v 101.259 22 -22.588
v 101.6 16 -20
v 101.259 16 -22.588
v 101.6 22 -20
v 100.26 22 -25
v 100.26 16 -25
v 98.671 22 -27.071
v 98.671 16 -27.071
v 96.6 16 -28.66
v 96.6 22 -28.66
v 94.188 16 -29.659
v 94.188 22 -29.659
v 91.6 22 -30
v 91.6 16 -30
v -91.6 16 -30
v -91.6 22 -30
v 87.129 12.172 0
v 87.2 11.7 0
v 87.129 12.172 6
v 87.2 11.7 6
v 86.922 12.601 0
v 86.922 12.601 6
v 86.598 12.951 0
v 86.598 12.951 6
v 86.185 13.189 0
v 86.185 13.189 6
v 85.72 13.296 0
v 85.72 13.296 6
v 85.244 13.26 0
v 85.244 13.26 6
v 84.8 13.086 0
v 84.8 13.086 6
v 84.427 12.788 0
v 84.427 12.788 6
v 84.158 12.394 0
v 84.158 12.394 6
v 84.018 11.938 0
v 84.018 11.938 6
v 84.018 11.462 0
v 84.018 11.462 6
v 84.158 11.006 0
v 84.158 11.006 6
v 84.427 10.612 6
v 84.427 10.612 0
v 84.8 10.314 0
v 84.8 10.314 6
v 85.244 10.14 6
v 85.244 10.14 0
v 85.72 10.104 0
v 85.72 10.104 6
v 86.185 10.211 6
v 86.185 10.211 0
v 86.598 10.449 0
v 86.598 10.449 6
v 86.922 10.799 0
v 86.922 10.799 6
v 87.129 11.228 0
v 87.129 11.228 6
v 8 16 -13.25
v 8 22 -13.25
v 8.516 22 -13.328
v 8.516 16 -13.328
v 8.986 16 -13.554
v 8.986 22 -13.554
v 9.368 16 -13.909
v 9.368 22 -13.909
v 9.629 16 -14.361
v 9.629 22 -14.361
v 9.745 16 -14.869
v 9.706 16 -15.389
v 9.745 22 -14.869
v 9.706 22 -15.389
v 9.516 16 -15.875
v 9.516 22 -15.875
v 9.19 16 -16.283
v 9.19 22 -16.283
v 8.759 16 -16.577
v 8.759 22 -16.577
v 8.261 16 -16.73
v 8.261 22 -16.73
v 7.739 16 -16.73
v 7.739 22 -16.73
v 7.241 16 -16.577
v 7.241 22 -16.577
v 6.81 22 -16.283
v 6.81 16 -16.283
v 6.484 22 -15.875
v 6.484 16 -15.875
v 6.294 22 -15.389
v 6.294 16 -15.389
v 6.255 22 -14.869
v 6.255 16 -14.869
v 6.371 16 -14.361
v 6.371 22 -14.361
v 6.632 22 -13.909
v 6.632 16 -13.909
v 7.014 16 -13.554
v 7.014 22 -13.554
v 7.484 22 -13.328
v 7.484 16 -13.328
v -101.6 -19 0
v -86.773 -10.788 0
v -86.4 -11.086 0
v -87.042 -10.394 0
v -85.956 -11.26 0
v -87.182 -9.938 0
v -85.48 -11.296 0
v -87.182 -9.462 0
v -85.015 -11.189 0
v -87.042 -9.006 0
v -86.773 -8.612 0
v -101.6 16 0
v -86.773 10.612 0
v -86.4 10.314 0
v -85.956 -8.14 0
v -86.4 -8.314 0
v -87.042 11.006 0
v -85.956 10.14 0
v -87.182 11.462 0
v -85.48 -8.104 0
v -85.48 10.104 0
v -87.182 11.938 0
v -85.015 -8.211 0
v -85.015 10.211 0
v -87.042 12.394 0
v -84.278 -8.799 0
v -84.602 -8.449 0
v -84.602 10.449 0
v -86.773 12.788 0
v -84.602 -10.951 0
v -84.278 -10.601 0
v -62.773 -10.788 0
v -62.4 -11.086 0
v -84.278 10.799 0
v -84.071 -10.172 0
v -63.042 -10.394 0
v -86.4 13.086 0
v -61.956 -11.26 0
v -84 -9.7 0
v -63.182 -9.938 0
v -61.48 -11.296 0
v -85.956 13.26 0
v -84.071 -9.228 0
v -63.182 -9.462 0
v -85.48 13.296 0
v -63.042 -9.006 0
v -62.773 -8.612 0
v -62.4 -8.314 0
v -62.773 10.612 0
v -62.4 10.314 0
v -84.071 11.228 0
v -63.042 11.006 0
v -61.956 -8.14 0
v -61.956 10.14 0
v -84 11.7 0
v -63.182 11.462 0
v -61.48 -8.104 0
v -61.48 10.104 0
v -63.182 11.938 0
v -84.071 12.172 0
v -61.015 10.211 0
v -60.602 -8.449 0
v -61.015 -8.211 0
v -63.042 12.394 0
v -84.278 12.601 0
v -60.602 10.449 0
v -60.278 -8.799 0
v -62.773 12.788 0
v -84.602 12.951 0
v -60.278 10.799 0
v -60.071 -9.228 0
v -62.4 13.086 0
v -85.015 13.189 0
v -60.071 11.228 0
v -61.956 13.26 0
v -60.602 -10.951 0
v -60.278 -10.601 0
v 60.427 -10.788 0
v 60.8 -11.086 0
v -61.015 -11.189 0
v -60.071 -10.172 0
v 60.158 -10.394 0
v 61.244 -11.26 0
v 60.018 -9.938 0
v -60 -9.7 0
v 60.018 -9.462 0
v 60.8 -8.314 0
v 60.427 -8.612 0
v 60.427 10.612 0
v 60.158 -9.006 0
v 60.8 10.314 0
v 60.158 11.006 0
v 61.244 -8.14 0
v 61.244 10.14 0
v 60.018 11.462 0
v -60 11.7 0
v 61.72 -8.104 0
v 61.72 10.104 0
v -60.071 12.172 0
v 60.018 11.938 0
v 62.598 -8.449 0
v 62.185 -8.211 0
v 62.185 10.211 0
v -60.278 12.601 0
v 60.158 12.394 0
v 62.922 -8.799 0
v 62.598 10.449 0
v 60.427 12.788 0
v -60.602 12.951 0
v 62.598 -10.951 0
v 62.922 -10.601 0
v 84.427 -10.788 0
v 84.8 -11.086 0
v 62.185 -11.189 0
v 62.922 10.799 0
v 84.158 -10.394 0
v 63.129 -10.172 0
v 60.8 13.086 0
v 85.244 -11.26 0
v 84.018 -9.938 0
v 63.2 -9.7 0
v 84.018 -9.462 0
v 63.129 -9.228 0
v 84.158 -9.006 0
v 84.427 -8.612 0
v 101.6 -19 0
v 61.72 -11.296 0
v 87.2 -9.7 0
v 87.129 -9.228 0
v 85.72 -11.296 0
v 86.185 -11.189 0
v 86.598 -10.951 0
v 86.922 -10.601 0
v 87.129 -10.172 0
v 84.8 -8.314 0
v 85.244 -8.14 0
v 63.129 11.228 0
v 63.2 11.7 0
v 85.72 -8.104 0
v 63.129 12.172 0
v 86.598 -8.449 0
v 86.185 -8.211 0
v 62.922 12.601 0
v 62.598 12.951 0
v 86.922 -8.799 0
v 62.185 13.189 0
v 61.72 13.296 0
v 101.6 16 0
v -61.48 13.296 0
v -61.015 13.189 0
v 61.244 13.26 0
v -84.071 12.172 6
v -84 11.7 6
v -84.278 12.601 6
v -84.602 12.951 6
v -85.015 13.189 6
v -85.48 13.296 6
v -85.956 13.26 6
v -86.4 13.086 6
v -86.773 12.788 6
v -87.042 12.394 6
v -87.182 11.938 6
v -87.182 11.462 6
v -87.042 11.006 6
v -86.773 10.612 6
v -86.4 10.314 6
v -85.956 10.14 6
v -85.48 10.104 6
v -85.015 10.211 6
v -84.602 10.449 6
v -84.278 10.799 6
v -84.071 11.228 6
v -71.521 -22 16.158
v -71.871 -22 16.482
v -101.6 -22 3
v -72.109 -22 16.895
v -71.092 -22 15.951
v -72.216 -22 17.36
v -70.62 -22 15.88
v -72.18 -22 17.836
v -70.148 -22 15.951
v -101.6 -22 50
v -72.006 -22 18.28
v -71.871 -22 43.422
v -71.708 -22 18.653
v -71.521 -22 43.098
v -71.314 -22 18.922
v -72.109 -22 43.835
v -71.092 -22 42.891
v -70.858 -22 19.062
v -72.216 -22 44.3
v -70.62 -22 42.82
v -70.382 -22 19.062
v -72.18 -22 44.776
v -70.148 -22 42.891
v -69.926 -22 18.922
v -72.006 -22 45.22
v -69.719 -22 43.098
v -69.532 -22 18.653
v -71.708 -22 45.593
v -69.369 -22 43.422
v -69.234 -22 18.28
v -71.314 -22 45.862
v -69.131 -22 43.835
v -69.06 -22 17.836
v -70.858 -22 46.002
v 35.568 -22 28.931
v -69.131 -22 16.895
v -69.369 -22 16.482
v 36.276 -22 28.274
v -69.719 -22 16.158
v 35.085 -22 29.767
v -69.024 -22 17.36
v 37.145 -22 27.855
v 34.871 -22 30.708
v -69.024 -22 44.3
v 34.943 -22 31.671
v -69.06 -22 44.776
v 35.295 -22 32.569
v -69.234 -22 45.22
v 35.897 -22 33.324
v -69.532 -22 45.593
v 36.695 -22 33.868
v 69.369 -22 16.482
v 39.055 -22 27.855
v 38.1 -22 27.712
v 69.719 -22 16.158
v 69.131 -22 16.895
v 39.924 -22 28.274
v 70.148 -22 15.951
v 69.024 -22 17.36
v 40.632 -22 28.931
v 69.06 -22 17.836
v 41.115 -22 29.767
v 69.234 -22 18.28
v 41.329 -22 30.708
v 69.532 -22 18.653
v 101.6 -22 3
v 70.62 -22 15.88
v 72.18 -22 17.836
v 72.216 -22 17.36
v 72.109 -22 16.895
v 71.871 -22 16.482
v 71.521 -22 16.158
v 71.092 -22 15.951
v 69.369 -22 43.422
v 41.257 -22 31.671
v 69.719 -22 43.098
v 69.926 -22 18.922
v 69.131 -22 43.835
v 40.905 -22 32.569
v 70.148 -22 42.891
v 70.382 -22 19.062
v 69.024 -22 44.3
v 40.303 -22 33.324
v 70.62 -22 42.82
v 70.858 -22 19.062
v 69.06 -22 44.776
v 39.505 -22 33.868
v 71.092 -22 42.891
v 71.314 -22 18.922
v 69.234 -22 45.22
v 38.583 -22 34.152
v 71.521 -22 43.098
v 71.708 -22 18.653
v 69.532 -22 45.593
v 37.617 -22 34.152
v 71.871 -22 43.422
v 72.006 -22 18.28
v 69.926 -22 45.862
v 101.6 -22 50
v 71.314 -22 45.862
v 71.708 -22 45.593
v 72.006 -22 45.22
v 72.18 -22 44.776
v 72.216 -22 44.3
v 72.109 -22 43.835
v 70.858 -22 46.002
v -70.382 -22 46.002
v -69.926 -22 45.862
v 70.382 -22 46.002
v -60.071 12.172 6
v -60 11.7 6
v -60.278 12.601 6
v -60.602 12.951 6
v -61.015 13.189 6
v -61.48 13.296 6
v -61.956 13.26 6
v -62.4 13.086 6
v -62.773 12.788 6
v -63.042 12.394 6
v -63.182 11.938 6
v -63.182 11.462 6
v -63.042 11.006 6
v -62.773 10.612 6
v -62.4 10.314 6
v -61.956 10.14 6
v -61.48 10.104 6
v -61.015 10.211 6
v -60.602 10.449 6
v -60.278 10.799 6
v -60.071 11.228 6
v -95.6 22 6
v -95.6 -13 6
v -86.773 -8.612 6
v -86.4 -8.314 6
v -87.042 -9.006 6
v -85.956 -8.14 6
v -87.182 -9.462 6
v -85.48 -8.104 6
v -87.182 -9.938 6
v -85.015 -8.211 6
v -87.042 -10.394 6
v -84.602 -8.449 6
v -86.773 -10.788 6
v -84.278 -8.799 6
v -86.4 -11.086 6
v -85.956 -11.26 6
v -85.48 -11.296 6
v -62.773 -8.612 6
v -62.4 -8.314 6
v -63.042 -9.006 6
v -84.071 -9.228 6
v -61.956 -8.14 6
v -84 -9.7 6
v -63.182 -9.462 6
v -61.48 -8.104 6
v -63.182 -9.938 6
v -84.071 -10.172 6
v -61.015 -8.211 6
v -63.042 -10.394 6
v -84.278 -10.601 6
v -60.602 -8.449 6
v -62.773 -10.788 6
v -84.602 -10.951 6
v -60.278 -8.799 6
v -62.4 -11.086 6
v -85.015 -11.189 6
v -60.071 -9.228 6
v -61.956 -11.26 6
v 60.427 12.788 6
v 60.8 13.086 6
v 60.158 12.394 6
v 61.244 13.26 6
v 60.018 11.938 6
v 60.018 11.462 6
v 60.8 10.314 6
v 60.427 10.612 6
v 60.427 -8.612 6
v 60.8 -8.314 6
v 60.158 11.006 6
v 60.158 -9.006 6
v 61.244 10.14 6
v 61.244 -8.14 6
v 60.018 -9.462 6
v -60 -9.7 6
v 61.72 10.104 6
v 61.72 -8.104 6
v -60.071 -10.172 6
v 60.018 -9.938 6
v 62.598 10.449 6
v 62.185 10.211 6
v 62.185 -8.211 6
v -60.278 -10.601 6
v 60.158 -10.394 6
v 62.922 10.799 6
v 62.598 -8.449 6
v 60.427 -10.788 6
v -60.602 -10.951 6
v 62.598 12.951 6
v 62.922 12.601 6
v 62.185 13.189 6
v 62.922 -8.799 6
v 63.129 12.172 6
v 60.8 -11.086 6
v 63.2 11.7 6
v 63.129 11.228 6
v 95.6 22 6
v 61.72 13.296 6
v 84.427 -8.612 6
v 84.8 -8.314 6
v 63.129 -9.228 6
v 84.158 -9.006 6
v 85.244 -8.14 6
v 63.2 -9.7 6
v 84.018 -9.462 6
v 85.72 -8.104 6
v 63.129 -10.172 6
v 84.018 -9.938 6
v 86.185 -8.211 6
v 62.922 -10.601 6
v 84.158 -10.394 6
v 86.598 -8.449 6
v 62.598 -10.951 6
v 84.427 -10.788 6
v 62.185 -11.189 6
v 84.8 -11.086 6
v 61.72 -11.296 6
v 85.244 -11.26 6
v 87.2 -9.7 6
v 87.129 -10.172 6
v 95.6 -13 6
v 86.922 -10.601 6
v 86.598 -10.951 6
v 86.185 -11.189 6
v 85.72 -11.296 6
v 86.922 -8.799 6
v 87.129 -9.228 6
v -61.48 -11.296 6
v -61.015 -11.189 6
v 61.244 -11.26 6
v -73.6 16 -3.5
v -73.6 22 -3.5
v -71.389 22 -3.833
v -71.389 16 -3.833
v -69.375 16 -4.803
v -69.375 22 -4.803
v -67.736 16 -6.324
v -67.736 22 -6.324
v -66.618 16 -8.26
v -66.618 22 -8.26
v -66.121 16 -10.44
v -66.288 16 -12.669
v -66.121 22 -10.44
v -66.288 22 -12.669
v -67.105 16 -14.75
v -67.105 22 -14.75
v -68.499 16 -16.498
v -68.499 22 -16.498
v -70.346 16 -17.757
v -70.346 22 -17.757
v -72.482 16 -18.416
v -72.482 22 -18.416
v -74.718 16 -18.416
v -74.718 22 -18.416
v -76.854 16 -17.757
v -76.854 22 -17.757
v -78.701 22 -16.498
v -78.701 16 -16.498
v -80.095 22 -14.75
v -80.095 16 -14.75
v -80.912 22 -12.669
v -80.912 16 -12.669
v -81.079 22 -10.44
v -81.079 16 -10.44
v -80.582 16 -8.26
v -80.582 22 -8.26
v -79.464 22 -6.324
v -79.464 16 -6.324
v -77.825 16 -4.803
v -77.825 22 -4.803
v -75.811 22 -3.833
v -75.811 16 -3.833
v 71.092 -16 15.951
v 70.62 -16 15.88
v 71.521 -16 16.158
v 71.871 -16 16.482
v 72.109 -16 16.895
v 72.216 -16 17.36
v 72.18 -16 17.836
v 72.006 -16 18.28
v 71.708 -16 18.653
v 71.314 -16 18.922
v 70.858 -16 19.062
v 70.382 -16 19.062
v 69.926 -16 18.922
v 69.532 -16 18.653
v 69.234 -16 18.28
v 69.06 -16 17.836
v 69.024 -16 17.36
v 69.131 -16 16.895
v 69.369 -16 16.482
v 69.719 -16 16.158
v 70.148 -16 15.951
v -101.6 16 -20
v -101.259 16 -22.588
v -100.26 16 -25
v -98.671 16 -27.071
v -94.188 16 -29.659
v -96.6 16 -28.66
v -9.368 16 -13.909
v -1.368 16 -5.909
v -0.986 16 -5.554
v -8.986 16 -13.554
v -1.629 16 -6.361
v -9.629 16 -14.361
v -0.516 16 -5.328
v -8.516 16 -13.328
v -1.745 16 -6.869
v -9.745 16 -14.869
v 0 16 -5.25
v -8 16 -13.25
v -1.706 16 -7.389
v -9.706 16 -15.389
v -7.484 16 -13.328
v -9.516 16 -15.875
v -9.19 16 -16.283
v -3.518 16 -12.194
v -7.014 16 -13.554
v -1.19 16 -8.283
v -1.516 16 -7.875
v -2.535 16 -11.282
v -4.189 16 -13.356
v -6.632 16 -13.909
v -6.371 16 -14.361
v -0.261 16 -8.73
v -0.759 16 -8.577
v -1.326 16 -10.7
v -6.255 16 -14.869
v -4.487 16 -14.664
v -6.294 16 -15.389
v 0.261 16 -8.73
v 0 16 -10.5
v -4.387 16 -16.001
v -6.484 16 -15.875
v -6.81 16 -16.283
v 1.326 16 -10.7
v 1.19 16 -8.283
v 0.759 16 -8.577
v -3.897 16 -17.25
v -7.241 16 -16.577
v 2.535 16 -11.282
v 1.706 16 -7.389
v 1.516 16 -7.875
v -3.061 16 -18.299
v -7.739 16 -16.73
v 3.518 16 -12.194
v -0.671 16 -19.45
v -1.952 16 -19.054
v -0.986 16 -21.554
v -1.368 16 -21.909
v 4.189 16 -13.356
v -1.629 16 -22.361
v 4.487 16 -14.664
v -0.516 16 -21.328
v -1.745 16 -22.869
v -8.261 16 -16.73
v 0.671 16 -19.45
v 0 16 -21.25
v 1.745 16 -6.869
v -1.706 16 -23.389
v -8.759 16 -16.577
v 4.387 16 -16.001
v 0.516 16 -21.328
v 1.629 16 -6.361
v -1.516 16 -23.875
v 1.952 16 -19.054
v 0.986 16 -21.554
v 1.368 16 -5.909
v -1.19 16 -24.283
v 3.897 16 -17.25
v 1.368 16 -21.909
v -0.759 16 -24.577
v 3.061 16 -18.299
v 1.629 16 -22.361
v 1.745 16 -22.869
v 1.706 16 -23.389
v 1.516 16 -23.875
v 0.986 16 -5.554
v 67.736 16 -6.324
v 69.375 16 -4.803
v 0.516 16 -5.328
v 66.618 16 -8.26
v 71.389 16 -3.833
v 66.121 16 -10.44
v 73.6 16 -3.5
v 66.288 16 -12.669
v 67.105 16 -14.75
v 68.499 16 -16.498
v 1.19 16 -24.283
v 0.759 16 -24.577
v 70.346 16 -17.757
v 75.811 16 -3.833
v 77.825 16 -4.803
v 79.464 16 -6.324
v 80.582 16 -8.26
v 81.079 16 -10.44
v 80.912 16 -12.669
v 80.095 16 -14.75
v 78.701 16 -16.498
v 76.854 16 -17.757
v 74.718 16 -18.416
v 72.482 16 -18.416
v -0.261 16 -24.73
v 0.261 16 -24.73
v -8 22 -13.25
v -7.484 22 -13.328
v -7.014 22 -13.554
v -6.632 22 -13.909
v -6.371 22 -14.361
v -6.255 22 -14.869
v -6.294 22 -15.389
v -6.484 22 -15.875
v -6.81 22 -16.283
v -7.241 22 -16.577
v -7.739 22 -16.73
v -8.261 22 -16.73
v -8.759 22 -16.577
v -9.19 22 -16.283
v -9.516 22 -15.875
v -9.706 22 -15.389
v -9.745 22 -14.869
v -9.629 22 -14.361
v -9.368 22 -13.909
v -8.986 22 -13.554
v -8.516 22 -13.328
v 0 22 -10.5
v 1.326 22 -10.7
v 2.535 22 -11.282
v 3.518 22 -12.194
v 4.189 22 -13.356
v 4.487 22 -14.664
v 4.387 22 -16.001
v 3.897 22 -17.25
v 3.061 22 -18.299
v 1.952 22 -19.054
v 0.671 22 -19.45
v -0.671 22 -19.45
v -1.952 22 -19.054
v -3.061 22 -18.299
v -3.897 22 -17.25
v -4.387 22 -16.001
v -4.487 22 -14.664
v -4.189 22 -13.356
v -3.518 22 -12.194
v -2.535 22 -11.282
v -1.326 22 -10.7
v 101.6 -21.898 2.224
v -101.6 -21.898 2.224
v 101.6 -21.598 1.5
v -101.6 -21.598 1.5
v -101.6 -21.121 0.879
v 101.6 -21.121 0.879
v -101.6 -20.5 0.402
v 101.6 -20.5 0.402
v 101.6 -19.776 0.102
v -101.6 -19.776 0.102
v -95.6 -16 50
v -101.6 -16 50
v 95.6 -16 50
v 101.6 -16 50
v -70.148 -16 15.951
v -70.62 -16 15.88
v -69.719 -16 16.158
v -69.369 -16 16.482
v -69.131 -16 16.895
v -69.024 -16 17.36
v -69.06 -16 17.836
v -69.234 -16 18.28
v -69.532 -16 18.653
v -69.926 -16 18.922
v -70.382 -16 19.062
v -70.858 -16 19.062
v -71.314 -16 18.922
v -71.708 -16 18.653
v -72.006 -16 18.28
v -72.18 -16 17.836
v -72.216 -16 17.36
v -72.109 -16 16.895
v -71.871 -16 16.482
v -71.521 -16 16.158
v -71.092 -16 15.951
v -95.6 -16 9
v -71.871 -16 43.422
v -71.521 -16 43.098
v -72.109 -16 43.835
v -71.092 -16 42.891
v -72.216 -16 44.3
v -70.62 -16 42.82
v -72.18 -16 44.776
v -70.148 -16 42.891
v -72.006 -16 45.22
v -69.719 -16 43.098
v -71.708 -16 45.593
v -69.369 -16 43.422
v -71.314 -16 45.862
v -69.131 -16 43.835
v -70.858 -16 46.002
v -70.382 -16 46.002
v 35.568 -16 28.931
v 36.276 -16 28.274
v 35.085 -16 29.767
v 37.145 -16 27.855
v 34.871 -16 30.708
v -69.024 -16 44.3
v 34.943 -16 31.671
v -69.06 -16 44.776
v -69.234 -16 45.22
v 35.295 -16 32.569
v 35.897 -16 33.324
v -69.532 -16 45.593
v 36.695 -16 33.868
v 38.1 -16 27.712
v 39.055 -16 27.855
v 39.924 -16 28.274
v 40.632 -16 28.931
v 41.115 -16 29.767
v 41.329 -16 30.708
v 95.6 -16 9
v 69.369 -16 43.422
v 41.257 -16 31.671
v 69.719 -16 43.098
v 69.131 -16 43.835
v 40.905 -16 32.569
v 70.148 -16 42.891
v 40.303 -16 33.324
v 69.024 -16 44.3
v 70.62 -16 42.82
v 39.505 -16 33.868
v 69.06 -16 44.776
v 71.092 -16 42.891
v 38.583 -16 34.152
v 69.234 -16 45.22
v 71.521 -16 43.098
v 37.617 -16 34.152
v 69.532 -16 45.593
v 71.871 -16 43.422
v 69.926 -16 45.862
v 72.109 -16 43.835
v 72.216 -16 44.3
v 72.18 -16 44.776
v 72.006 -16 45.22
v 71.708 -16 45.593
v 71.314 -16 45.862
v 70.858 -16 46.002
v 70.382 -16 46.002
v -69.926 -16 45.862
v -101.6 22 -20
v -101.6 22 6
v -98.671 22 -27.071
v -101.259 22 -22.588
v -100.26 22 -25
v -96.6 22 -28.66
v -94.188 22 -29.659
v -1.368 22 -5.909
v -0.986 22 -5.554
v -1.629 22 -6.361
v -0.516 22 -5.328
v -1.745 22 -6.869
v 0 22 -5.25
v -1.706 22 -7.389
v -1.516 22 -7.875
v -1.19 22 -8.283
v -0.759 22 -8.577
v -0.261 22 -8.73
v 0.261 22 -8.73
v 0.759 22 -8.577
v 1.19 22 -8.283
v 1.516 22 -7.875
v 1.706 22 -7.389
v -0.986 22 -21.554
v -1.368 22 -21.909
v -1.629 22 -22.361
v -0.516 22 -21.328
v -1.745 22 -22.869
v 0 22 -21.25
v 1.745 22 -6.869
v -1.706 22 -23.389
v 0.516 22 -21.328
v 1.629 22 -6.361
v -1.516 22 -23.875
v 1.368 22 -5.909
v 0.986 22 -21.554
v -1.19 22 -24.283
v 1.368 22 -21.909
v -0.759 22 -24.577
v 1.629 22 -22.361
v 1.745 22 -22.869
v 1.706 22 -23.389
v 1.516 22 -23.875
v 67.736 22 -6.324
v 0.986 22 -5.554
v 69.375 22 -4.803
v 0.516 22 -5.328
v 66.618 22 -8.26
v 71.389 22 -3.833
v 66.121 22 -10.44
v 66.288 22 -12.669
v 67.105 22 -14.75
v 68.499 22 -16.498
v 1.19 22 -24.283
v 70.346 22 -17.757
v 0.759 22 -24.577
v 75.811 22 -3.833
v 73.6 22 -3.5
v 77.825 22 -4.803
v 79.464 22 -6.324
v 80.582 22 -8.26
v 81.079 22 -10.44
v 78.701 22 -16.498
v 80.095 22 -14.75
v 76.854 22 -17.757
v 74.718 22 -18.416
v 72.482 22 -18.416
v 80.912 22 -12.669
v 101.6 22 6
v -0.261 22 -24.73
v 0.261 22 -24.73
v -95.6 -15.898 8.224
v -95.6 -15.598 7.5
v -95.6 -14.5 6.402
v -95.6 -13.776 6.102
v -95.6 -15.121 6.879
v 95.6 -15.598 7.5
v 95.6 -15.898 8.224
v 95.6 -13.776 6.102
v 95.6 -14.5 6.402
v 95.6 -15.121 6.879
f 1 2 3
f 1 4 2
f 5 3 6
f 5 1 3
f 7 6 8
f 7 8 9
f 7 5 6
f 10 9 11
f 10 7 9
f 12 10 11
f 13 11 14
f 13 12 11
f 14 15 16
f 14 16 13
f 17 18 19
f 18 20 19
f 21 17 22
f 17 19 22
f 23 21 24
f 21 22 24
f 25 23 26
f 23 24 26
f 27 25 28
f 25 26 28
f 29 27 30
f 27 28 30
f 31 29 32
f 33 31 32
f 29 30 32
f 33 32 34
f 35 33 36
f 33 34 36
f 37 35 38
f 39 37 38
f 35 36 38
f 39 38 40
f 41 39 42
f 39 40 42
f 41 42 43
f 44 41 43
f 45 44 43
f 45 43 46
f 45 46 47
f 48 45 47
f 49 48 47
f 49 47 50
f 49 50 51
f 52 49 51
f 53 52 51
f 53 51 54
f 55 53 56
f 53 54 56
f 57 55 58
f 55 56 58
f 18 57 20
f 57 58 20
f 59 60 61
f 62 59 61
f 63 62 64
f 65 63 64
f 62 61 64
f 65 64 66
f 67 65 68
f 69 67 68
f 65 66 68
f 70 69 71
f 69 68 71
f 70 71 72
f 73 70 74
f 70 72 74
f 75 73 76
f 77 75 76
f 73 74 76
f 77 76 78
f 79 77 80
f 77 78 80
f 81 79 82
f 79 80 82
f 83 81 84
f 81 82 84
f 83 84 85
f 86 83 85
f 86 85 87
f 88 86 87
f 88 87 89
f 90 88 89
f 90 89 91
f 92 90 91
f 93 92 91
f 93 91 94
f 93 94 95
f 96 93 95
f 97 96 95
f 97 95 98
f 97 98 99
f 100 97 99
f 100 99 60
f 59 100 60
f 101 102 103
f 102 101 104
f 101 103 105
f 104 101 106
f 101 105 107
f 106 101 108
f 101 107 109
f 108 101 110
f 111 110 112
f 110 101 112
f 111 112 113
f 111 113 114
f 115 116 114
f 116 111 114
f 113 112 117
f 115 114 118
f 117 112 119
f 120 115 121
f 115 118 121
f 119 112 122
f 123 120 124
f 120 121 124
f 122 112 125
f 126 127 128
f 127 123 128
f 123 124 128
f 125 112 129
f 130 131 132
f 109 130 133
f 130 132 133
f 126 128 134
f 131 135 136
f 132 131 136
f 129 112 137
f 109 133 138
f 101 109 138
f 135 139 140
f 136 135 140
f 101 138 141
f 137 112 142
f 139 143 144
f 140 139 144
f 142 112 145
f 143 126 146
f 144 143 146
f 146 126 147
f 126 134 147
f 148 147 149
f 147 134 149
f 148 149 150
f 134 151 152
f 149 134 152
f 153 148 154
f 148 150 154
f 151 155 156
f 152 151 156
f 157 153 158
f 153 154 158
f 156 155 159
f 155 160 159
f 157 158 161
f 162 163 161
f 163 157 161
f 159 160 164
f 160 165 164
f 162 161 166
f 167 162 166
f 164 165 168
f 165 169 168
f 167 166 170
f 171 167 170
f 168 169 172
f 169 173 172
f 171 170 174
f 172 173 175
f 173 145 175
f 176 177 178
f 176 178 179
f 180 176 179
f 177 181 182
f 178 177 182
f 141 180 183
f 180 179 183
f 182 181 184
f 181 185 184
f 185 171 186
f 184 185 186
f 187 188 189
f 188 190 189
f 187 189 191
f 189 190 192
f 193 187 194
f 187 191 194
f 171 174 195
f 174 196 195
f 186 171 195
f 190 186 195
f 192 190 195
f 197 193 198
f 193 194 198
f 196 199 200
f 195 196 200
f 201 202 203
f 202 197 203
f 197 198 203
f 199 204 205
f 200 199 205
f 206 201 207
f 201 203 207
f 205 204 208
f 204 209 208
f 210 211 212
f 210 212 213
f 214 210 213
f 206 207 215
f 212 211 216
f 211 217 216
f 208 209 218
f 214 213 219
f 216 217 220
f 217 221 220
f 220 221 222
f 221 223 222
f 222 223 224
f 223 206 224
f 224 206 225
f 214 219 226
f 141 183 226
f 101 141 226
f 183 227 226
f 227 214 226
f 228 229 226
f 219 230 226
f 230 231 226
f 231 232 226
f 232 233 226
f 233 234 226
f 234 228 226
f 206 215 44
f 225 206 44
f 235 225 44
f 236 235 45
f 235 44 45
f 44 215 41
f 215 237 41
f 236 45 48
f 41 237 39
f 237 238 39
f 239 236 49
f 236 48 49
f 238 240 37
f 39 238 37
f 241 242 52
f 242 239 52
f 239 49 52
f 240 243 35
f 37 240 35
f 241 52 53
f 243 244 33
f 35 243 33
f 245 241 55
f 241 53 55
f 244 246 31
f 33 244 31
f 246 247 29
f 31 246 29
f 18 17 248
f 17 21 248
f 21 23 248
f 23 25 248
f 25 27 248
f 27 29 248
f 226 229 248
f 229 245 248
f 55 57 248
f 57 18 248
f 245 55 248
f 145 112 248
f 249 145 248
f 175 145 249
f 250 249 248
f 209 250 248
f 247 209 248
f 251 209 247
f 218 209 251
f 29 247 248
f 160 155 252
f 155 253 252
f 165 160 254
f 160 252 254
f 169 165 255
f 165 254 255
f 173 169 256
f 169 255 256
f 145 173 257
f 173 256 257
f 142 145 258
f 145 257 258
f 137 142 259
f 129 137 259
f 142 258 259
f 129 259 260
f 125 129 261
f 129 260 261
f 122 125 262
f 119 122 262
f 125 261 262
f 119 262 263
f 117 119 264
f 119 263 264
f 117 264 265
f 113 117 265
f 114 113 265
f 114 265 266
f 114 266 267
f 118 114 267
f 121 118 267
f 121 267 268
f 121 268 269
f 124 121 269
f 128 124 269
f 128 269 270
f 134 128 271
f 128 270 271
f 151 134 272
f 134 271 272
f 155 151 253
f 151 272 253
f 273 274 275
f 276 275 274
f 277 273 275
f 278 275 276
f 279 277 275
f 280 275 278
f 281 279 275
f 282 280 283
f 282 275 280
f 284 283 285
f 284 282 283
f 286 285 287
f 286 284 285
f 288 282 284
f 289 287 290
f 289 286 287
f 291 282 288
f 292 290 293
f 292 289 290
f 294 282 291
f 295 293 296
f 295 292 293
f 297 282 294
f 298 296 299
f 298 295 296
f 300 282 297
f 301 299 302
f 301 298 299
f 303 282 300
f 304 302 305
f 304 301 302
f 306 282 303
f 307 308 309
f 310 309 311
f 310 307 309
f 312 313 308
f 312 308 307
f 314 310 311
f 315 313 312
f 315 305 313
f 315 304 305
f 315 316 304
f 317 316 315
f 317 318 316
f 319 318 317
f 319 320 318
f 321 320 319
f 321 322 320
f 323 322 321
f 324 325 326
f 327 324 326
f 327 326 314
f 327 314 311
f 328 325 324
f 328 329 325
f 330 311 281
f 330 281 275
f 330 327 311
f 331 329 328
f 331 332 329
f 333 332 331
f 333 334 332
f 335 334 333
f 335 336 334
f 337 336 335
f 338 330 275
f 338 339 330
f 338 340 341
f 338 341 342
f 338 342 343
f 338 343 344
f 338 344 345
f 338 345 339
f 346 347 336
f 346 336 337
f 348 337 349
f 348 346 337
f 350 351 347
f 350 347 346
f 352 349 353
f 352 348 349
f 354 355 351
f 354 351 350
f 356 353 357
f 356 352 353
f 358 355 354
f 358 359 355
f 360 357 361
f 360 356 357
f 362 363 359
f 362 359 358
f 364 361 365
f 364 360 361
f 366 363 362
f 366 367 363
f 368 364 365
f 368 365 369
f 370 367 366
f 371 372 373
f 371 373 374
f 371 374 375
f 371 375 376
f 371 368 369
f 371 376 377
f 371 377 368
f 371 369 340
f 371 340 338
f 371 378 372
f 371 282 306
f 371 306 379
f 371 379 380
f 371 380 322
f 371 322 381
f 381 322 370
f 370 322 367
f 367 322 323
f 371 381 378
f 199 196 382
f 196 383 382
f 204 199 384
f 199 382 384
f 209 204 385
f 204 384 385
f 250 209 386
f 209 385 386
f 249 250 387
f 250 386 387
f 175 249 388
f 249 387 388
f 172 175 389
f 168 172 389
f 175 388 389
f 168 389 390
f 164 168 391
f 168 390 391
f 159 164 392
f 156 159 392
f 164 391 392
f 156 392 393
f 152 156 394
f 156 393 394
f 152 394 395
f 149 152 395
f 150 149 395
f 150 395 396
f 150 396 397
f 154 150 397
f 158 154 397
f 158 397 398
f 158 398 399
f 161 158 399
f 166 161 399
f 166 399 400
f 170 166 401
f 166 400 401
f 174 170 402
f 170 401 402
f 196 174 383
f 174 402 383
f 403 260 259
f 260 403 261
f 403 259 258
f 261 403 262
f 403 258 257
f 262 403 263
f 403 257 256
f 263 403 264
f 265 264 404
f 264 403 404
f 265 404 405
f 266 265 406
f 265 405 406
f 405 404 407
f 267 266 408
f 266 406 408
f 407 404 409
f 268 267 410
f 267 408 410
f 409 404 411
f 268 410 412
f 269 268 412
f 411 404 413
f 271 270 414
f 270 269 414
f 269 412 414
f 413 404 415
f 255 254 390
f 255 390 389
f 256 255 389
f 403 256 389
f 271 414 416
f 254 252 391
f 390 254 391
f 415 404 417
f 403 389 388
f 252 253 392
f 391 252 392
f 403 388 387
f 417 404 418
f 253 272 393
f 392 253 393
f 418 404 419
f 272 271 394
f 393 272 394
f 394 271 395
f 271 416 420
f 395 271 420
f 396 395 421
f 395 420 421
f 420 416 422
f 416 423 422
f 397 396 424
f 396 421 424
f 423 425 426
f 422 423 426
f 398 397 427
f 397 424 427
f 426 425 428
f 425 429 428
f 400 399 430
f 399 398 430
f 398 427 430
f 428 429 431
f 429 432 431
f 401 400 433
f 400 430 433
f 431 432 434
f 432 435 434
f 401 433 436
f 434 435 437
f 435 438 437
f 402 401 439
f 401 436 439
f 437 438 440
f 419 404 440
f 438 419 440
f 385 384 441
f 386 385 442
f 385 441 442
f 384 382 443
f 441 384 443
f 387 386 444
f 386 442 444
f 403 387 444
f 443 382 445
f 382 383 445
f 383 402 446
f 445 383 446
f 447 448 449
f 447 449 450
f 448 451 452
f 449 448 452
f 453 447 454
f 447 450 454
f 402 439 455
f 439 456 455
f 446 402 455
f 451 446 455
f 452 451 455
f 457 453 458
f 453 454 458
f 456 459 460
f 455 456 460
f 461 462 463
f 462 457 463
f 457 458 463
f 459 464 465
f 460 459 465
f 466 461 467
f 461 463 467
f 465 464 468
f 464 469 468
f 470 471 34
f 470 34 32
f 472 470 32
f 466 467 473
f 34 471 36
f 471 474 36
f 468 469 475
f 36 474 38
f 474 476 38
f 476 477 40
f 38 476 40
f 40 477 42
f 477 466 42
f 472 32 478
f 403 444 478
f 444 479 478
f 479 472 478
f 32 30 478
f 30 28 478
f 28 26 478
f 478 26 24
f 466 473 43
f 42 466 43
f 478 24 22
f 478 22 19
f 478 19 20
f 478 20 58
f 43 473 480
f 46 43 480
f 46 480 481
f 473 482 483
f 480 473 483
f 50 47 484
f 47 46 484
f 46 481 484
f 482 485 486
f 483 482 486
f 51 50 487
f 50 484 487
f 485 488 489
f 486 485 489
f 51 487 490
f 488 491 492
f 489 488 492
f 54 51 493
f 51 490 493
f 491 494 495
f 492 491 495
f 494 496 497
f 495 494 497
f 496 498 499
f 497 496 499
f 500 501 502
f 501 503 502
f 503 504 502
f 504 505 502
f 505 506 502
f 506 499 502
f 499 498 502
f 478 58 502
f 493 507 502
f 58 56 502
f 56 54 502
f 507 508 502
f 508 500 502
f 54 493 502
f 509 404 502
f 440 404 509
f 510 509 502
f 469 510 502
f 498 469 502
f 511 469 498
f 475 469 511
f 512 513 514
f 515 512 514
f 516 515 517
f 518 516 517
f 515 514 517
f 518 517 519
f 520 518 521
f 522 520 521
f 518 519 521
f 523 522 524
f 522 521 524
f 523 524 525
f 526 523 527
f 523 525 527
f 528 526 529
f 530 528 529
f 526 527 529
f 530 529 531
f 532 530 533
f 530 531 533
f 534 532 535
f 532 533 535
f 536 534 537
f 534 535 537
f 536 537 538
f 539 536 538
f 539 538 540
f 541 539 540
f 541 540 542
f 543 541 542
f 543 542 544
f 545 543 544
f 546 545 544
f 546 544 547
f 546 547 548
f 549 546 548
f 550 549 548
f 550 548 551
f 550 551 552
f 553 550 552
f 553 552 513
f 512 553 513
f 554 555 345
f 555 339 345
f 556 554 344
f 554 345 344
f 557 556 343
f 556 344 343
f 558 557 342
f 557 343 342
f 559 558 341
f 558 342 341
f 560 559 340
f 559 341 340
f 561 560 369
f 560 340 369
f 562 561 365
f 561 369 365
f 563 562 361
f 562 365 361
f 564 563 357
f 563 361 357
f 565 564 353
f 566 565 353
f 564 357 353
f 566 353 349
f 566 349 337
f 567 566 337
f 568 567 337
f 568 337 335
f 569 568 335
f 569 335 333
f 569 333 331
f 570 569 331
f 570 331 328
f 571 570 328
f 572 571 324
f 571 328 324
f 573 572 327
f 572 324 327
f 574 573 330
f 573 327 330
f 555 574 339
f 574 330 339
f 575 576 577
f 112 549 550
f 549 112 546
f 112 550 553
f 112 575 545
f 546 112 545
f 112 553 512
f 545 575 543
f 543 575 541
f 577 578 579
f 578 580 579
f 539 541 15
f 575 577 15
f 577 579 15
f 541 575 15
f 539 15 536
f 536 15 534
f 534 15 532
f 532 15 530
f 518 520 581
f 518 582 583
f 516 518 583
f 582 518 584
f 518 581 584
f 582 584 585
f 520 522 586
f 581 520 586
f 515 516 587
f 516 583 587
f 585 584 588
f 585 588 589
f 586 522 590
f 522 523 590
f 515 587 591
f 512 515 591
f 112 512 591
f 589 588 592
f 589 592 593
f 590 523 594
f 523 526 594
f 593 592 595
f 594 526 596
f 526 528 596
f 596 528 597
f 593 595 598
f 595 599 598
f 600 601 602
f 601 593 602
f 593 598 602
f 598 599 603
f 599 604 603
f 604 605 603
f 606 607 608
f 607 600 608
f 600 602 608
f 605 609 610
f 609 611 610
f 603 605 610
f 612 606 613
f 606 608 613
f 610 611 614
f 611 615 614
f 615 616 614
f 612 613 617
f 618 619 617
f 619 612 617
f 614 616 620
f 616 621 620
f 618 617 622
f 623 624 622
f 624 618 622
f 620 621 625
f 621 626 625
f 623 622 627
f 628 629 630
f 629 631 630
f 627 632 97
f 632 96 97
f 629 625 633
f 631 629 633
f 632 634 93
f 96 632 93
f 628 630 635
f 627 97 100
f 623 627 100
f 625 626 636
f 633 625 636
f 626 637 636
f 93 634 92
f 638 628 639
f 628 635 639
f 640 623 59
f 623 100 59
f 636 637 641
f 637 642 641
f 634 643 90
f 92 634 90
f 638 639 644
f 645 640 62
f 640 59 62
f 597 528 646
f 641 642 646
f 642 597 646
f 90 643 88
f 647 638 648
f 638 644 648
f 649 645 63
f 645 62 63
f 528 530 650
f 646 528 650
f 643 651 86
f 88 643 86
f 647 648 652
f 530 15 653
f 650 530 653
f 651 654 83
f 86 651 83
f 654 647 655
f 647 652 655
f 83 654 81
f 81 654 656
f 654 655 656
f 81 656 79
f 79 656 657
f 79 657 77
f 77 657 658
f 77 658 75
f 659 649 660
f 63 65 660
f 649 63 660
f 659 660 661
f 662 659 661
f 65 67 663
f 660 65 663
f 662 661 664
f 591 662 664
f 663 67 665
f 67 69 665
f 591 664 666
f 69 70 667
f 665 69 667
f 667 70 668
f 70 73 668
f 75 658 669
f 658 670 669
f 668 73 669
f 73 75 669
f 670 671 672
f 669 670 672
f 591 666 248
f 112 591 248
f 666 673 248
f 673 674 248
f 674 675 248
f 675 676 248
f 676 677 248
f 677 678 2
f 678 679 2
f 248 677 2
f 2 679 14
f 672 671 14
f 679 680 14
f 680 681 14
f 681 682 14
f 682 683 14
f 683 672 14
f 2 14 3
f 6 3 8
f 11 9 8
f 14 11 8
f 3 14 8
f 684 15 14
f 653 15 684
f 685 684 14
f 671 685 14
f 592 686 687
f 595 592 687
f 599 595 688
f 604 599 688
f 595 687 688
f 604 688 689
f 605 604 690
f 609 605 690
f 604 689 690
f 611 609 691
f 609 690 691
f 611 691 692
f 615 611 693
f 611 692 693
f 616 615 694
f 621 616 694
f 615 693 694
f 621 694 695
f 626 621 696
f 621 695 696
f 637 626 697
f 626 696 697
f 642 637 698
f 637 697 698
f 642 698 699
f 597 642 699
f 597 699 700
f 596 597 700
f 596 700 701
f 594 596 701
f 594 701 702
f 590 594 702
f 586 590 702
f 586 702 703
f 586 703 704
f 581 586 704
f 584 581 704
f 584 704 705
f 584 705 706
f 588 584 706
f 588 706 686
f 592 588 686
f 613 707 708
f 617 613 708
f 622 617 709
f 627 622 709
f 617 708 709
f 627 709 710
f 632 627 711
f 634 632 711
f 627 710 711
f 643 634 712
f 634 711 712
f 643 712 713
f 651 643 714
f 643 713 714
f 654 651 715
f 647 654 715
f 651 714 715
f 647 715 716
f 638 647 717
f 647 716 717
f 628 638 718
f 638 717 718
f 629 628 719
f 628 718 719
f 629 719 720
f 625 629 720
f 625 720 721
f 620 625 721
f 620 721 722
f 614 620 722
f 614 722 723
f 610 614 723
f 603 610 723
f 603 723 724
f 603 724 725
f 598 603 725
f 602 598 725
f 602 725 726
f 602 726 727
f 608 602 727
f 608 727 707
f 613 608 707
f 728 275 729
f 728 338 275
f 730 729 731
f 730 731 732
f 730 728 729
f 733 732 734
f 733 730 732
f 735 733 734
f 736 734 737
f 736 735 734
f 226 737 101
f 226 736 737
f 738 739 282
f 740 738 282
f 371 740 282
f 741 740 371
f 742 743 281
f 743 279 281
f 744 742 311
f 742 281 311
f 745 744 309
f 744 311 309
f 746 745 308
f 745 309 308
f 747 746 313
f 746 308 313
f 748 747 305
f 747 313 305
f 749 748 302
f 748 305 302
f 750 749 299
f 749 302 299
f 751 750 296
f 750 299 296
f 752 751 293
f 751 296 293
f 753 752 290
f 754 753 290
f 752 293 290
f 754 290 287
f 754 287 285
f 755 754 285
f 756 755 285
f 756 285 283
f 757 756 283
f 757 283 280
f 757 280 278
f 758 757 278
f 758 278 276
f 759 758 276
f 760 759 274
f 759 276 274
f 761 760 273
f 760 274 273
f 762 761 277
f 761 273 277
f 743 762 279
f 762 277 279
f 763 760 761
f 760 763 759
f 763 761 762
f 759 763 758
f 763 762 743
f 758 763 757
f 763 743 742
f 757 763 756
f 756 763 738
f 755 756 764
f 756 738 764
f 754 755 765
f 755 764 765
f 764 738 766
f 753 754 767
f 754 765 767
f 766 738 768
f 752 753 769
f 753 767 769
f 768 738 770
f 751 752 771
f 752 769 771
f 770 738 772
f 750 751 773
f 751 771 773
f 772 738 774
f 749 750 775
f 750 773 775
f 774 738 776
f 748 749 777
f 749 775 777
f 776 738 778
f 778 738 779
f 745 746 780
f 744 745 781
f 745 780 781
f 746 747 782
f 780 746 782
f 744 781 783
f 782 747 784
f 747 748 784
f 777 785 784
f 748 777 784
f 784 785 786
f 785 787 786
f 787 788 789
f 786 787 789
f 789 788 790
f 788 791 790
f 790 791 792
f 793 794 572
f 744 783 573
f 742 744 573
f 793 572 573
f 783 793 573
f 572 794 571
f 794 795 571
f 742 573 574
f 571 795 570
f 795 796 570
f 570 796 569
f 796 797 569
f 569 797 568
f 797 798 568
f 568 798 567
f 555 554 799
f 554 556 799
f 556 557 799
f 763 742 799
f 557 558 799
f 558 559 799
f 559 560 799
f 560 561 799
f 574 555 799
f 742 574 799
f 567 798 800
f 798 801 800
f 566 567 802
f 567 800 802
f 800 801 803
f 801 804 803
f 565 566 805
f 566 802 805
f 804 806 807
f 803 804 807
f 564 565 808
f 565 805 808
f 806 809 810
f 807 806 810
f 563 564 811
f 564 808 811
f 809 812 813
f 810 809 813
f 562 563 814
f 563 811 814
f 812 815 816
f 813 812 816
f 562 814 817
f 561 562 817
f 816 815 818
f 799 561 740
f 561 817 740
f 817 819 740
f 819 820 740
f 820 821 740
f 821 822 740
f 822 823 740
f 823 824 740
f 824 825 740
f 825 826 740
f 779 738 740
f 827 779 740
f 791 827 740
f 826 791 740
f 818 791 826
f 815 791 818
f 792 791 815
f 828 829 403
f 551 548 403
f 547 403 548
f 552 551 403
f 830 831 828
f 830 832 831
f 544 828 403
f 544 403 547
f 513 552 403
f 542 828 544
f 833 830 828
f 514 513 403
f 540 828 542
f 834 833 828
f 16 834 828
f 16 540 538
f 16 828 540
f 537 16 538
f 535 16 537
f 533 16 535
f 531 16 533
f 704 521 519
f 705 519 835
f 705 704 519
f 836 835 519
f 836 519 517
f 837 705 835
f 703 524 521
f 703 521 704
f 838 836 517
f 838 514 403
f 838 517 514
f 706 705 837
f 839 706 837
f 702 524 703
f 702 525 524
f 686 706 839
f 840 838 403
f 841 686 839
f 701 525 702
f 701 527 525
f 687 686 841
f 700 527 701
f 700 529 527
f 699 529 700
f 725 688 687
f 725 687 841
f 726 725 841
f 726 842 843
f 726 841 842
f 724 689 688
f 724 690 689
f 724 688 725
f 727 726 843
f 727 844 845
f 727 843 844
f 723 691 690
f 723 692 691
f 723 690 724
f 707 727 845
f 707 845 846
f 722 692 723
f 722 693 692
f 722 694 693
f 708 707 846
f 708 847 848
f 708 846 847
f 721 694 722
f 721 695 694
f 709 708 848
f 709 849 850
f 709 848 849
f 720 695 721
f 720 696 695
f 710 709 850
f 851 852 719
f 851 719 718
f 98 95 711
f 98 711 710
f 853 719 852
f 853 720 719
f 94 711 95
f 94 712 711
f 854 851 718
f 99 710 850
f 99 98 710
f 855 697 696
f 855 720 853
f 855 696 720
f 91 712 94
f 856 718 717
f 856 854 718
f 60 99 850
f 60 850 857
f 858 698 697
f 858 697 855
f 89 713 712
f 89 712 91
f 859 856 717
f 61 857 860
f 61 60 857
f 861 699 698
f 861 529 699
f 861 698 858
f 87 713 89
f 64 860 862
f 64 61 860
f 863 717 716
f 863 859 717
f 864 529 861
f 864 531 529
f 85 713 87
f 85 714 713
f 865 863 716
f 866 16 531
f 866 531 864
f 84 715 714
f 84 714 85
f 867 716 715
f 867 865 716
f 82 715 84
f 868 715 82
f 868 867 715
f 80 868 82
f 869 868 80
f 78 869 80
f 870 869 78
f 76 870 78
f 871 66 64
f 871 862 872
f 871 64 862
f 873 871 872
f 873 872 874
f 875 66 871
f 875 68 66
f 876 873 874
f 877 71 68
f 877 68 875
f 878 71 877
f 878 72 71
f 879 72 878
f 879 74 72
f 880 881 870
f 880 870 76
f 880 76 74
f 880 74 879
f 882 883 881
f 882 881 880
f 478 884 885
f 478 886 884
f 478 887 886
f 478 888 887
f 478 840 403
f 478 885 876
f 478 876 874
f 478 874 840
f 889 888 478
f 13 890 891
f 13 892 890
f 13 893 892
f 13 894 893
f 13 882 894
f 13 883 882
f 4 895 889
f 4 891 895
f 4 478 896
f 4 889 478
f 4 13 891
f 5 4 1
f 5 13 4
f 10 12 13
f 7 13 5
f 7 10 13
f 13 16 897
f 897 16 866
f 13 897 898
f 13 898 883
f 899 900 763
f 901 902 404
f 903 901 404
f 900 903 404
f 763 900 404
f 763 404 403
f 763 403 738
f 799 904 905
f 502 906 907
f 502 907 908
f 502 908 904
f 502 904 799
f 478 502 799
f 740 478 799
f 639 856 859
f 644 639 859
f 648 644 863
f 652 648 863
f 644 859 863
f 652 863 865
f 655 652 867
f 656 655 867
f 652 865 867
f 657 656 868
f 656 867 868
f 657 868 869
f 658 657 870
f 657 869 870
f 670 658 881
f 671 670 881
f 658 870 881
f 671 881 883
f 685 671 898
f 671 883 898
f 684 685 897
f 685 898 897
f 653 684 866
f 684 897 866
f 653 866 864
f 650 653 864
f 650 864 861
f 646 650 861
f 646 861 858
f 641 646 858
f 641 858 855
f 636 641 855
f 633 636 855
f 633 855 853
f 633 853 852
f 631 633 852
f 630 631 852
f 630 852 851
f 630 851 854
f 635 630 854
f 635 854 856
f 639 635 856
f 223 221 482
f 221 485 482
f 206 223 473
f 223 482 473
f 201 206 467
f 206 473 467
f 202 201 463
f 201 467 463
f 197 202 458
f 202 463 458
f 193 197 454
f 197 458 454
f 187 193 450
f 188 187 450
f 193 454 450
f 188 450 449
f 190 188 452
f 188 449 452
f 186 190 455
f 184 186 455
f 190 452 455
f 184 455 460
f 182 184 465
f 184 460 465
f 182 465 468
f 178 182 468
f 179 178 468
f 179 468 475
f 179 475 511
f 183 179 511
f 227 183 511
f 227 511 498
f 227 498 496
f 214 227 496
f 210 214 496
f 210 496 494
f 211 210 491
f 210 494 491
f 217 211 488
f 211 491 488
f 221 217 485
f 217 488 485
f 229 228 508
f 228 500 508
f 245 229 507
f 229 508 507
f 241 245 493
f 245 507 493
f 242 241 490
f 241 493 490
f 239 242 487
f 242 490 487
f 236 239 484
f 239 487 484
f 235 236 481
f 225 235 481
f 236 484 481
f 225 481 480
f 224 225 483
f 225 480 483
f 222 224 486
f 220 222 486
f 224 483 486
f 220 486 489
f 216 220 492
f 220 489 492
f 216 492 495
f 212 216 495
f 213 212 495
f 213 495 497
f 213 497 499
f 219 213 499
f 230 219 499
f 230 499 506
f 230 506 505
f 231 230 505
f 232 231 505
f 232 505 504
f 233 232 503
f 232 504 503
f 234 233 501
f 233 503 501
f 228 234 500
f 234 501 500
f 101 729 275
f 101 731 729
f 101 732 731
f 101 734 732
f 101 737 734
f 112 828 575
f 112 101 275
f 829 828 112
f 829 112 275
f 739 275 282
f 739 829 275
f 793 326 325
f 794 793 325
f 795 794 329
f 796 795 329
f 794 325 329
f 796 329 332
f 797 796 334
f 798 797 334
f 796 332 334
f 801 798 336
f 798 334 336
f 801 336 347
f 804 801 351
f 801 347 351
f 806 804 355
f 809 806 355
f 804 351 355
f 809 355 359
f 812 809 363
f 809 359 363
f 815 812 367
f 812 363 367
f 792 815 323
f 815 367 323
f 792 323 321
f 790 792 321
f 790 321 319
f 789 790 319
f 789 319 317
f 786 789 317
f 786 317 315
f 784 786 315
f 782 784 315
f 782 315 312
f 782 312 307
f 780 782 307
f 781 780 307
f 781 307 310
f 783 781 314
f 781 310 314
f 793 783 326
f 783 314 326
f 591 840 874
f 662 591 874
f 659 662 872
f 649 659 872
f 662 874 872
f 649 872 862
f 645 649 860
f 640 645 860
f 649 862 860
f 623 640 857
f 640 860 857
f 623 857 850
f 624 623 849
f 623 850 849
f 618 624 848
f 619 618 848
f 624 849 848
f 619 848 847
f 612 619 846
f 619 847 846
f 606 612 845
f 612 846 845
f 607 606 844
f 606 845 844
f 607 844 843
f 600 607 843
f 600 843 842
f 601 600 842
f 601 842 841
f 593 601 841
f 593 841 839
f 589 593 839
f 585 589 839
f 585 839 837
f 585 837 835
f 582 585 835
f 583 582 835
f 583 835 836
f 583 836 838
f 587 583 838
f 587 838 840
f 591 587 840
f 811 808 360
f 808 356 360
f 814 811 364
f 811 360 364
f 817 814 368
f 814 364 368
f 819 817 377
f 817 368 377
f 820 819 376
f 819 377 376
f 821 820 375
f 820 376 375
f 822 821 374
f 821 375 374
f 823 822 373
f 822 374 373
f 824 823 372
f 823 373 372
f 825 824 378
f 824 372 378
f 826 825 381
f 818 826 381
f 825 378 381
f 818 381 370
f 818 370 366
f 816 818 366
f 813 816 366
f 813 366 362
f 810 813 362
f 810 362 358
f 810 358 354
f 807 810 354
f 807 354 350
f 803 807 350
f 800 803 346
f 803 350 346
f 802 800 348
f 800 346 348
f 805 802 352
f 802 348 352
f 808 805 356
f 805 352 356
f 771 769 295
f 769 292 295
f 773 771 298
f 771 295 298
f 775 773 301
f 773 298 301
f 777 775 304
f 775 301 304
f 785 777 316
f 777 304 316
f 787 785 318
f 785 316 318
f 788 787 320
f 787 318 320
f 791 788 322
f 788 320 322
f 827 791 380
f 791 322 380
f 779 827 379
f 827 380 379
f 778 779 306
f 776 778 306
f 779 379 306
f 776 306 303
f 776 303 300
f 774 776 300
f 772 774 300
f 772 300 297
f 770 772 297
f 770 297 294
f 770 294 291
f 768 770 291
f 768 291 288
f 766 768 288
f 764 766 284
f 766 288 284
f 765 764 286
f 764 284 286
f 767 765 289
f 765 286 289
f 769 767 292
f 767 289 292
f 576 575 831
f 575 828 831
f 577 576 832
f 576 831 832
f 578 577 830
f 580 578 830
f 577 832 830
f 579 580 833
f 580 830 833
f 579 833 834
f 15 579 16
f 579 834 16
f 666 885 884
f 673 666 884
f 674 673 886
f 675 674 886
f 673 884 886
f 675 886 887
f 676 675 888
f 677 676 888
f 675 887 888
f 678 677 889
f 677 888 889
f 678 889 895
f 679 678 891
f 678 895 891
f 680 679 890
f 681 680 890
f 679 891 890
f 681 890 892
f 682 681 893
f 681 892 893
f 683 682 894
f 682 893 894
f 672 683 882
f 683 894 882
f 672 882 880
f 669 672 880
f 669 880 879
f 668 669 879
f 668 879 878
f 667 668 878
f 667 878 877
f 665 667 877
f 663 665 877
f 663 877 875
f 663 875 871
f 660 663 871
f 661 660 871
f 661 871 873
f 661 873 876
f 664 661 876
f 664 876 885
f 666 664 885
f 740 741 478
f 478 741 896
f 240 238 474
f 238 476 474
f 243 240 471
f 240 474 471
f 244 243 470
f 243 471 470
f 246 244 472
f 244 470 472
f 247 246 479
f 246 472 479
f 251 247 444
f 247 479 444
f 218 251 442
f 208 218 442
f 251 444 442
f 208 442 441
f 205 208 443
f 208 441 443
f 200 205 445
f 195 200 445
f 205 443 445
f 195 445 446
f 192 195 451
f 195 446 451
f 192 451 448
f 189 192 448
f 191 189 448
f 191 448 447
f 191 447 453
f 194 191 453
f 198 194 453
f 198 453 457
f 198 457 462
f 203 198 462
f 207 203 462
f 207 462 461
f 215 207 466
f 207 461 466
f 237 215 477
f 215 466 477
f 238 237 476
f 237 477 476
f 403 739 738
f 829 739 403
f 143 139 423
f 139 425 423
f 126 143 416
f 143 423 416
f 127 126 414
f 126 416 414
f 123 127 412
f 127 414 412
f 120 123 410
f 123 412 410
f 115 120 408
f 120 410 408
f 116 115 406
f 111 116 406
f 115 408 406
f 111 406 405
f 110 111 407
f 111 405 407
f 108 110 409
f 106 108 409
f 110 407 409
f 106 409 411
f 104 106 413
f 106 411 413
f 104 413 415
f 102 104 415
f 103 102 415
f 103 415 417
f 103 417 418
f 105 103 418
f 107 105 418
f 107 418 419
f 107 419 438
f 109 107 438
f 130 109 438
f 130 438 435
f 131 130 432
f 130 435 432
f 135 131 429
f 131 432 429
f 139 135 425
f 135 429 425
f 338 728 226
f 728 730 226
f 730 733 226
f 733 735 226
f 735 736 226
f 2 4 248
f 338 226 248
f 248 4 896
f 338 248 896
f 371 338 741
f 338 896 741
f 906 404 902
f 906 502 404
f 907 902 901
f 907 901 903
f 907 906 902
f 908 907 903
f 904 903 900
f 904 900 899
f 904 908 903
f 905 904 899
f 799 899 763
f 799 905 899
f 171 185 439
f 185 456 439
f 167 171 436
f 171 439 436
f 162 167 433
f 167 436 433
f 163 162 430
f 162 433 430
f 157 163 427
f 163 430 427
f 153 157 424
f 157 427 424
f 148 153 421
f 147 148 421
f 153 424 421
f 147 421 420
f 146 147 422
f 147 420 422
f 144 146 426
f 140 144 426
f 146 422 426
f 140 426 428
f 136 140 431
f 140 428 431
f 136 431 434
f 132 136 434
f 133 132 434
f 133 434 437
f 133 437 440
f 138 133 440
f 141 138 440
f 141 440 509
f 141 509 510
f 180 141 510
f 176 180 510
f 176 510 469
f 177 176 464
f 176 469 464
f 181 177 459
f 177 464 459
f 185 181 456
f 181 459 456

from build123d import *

# Parameters (mm, degrees)
ESQUISSE1_W             = 203.2
ESQUISSE1_H             = 32
BOSS_EXTRU_1_DEPTH      = 6
ESQUISSE2_W             = 203.2
ESQUISSE2_H             = 36
BOSS_EXTRU_2_DEPTH      = 6
ESQUISSE3_R             = 7.5
ESQUISSE3_R_2           = 4.5
ESQUISSE3_R_3           = 1.75
ENL_V_MAT_EXTRU_1_DEPTH = 113.545812894
ESQUISSE6_W             = 203.2
ESQUISSE6_H             = 50
BOSS_EXTRU_4_DEPTH      = 6
BOSS_EXTRU_5_DEPTH      = 6
CONG_3_R                = 3
CONG_4_R                = 10
D_GAGEMENT_M31_D        = 3.2
D_GAGEMENT_M31_DEPTH    = 6
D_GAGEMENT_M31_TIP      = 0.96137699
ESQUISSE11_R            = 3.2385
ENL_V_MAT_EXTRU_3_DEPTH = 6
D_GAGEMENT_M32_D        = 3.2
D_GAGEMENT_M32_DEPTH    = 6
D_GAGEMENT_M32_TIP      = 0.96137699


with BuildPart() as part:
    # Esquisse1 → Boss.-Extru.1 (new body)
    with BuildSketch(Plane.XY):
        Rectangle(ESQUISSE1_W, ESQUISSE1_H)
    extrude(amount=BOSS_EXTRU_1_DEPTH)

    # Esquisse2 → Boss.-Extru.2 (add)
    with BuildSketch(Plane(origin=(0, 16, 0), x_dir=(1, 0, 0), z_dir=(0, 1, 0))):
        with Locations((0, 12)):
            Rectangle(ESQUISSE2_W, ESQUISSE2_H)
    extrude(amount=BOSS_EXTRU_2_DEPTH)

    # Esquisse3 → Enlèv. mat.-Extru.1 (cut, through all)
    with BuildSketch(Plane(origin=(0, 22, 0), x_dir=(1, 0, 0), z_dir=(0, 1, 0))):
        with Locations(Location((-73.6, 11, 0), (0, 0, 270))):
            Circle(ESQUISSE3_R)
        with Locations(Location((73.6, 11, 0), (0, 0, 270))):
            Circle(ESQUISSE3_R)
        with Locations(Location((0, 15, 0), (0, 0, 270))):
            Circle(ESQUISSE3_R_2)
        with Locations(Location((0, 23, 0), (0, 0, 270))):
            Circle(ESQUISSE3_R_3)
        with Locations(Location((0, 7, 0), (0, 0, 270))):
            Circle(ESQUISSE3_R_3)
        with Locations(Location((8, 15, 0), (0, 0, 270))):
            Circle(ESQUISSE3_R_3)
        with Locations(Location((-8, 15, 0), (0, 0, 270))):
            Circle(ESQUISSE3_R_3)
    extrude(amount=-ENL_V_MAT_EXTRU_1_DEPTH, mode=Mode.SUBTRACT)

    # Esquisse6 → Boss.-Extru.4 (add)
    with BuildSketch(Plane.XZ.offset(16)):
        with Locations((0, 25)):
            Rectangle(ESQUISSE6_W, ESQUISSE6_H)
    extrude(amount=BOSS_EXTRU_4_DEPTH)

    # Esquisse7 → Boss.-Extru.5 (add)
    with BuildSketch(Plane(origin=(101.6, 0, 0), x_dir=(0, 0, -1), z_dir=(1, 0, 0))):
        Polygon((-50, -16), (-6, 22), (0, 22), (0, -16), align=None)
    boss_extru_5 = extrude(amount=-BOSS_EXTRU_5_DEPTH)

    # Symétrie1: Boss.-Extru.5 across plane
    add(boss_extru_5.mirror(Plane(origin=(0, 0, 0), x_dir=(0, 0, 1), z_dir=(1, 0, 0))))

    # Congé3
    cong_3_edges = [part.edges().sort_by_distance(p)[0] for p in [
        (0, -16, 6),
        (0, -22, 0),
    ]]
    fillet(cong_3_edges, radius=CONG_3_R)

    # Congé4
    cong_4_edges = [part.edges().sort_by_distance(p)[0] for p in [
        (101.6, 19, -30),
        (-101.6, 19, -30),
    ]]
    fillet(cong_4_edges, radius=CONG_4_R)

    # Dégagement M31
    with Locations(Plane(origin=(85.6, 11.7, 0), x_dir=(-1, 0, 0), z_dir=(0, 0, -1))):
        with Locations((0, 0), (24, 0), (0, -21.4), (24, -21.4), (147.2, 0), (171.2, 0), (147.2, -21.4), (171.2, -21.4)):
            Hole(D_GAGEMENT_M31_D / 2, depth=D_GAGEMENT_M31_DEPTH)
            with Locations((0, 0, -(D_GAGEMENT_M31_DEPTH + D_GAGEMENT_M31_TIP / 2))):  # 118° drill point
                Cone(0, D_GAGEMENT_M31_D / 2, D_GAGEMENT_M31_TIP, mode=Mode.SUBTRACT)

    # Esquisse11 → Enlèv. mat.-Extru.3 (cut)
    with BuildSketch(Plane.XZ.offset(22)):
        with Locations(Location((38.1, 30.95, 0), (0, 0, 270))):
            Circle(ESQUISSE11_R)
    extrude(amount=-ENL_V_MAT_EXTRU_3_DEPTH, mode=Mode.SUBTRACT)

    # Dégagement M32
    with Locations(Plane(origin=(-70.62, -16, 17.48), x_dir=(0, 0, 1), z_dir=(0, 1, 0))):
        with Locations((0, 0), (26.94, 0), (0, 141.24), (26.94, 141.24)):
            Hole(D_GAGEMENT_M32_D / 2, depth=D_GAGEMENT_M32_DEPTH)
            with Locations((0, 0, -(D_GAGEMENT_M32_DEPTH + D_GAGEMENT_M32_TIP / 2))):  # 118° drill point
                Cone(0, D_GAGEMENT_M32_D / 2, D_GAGEMENT_M32_TIP, mode=Mode.SUBTRACT)


solid = part.part
